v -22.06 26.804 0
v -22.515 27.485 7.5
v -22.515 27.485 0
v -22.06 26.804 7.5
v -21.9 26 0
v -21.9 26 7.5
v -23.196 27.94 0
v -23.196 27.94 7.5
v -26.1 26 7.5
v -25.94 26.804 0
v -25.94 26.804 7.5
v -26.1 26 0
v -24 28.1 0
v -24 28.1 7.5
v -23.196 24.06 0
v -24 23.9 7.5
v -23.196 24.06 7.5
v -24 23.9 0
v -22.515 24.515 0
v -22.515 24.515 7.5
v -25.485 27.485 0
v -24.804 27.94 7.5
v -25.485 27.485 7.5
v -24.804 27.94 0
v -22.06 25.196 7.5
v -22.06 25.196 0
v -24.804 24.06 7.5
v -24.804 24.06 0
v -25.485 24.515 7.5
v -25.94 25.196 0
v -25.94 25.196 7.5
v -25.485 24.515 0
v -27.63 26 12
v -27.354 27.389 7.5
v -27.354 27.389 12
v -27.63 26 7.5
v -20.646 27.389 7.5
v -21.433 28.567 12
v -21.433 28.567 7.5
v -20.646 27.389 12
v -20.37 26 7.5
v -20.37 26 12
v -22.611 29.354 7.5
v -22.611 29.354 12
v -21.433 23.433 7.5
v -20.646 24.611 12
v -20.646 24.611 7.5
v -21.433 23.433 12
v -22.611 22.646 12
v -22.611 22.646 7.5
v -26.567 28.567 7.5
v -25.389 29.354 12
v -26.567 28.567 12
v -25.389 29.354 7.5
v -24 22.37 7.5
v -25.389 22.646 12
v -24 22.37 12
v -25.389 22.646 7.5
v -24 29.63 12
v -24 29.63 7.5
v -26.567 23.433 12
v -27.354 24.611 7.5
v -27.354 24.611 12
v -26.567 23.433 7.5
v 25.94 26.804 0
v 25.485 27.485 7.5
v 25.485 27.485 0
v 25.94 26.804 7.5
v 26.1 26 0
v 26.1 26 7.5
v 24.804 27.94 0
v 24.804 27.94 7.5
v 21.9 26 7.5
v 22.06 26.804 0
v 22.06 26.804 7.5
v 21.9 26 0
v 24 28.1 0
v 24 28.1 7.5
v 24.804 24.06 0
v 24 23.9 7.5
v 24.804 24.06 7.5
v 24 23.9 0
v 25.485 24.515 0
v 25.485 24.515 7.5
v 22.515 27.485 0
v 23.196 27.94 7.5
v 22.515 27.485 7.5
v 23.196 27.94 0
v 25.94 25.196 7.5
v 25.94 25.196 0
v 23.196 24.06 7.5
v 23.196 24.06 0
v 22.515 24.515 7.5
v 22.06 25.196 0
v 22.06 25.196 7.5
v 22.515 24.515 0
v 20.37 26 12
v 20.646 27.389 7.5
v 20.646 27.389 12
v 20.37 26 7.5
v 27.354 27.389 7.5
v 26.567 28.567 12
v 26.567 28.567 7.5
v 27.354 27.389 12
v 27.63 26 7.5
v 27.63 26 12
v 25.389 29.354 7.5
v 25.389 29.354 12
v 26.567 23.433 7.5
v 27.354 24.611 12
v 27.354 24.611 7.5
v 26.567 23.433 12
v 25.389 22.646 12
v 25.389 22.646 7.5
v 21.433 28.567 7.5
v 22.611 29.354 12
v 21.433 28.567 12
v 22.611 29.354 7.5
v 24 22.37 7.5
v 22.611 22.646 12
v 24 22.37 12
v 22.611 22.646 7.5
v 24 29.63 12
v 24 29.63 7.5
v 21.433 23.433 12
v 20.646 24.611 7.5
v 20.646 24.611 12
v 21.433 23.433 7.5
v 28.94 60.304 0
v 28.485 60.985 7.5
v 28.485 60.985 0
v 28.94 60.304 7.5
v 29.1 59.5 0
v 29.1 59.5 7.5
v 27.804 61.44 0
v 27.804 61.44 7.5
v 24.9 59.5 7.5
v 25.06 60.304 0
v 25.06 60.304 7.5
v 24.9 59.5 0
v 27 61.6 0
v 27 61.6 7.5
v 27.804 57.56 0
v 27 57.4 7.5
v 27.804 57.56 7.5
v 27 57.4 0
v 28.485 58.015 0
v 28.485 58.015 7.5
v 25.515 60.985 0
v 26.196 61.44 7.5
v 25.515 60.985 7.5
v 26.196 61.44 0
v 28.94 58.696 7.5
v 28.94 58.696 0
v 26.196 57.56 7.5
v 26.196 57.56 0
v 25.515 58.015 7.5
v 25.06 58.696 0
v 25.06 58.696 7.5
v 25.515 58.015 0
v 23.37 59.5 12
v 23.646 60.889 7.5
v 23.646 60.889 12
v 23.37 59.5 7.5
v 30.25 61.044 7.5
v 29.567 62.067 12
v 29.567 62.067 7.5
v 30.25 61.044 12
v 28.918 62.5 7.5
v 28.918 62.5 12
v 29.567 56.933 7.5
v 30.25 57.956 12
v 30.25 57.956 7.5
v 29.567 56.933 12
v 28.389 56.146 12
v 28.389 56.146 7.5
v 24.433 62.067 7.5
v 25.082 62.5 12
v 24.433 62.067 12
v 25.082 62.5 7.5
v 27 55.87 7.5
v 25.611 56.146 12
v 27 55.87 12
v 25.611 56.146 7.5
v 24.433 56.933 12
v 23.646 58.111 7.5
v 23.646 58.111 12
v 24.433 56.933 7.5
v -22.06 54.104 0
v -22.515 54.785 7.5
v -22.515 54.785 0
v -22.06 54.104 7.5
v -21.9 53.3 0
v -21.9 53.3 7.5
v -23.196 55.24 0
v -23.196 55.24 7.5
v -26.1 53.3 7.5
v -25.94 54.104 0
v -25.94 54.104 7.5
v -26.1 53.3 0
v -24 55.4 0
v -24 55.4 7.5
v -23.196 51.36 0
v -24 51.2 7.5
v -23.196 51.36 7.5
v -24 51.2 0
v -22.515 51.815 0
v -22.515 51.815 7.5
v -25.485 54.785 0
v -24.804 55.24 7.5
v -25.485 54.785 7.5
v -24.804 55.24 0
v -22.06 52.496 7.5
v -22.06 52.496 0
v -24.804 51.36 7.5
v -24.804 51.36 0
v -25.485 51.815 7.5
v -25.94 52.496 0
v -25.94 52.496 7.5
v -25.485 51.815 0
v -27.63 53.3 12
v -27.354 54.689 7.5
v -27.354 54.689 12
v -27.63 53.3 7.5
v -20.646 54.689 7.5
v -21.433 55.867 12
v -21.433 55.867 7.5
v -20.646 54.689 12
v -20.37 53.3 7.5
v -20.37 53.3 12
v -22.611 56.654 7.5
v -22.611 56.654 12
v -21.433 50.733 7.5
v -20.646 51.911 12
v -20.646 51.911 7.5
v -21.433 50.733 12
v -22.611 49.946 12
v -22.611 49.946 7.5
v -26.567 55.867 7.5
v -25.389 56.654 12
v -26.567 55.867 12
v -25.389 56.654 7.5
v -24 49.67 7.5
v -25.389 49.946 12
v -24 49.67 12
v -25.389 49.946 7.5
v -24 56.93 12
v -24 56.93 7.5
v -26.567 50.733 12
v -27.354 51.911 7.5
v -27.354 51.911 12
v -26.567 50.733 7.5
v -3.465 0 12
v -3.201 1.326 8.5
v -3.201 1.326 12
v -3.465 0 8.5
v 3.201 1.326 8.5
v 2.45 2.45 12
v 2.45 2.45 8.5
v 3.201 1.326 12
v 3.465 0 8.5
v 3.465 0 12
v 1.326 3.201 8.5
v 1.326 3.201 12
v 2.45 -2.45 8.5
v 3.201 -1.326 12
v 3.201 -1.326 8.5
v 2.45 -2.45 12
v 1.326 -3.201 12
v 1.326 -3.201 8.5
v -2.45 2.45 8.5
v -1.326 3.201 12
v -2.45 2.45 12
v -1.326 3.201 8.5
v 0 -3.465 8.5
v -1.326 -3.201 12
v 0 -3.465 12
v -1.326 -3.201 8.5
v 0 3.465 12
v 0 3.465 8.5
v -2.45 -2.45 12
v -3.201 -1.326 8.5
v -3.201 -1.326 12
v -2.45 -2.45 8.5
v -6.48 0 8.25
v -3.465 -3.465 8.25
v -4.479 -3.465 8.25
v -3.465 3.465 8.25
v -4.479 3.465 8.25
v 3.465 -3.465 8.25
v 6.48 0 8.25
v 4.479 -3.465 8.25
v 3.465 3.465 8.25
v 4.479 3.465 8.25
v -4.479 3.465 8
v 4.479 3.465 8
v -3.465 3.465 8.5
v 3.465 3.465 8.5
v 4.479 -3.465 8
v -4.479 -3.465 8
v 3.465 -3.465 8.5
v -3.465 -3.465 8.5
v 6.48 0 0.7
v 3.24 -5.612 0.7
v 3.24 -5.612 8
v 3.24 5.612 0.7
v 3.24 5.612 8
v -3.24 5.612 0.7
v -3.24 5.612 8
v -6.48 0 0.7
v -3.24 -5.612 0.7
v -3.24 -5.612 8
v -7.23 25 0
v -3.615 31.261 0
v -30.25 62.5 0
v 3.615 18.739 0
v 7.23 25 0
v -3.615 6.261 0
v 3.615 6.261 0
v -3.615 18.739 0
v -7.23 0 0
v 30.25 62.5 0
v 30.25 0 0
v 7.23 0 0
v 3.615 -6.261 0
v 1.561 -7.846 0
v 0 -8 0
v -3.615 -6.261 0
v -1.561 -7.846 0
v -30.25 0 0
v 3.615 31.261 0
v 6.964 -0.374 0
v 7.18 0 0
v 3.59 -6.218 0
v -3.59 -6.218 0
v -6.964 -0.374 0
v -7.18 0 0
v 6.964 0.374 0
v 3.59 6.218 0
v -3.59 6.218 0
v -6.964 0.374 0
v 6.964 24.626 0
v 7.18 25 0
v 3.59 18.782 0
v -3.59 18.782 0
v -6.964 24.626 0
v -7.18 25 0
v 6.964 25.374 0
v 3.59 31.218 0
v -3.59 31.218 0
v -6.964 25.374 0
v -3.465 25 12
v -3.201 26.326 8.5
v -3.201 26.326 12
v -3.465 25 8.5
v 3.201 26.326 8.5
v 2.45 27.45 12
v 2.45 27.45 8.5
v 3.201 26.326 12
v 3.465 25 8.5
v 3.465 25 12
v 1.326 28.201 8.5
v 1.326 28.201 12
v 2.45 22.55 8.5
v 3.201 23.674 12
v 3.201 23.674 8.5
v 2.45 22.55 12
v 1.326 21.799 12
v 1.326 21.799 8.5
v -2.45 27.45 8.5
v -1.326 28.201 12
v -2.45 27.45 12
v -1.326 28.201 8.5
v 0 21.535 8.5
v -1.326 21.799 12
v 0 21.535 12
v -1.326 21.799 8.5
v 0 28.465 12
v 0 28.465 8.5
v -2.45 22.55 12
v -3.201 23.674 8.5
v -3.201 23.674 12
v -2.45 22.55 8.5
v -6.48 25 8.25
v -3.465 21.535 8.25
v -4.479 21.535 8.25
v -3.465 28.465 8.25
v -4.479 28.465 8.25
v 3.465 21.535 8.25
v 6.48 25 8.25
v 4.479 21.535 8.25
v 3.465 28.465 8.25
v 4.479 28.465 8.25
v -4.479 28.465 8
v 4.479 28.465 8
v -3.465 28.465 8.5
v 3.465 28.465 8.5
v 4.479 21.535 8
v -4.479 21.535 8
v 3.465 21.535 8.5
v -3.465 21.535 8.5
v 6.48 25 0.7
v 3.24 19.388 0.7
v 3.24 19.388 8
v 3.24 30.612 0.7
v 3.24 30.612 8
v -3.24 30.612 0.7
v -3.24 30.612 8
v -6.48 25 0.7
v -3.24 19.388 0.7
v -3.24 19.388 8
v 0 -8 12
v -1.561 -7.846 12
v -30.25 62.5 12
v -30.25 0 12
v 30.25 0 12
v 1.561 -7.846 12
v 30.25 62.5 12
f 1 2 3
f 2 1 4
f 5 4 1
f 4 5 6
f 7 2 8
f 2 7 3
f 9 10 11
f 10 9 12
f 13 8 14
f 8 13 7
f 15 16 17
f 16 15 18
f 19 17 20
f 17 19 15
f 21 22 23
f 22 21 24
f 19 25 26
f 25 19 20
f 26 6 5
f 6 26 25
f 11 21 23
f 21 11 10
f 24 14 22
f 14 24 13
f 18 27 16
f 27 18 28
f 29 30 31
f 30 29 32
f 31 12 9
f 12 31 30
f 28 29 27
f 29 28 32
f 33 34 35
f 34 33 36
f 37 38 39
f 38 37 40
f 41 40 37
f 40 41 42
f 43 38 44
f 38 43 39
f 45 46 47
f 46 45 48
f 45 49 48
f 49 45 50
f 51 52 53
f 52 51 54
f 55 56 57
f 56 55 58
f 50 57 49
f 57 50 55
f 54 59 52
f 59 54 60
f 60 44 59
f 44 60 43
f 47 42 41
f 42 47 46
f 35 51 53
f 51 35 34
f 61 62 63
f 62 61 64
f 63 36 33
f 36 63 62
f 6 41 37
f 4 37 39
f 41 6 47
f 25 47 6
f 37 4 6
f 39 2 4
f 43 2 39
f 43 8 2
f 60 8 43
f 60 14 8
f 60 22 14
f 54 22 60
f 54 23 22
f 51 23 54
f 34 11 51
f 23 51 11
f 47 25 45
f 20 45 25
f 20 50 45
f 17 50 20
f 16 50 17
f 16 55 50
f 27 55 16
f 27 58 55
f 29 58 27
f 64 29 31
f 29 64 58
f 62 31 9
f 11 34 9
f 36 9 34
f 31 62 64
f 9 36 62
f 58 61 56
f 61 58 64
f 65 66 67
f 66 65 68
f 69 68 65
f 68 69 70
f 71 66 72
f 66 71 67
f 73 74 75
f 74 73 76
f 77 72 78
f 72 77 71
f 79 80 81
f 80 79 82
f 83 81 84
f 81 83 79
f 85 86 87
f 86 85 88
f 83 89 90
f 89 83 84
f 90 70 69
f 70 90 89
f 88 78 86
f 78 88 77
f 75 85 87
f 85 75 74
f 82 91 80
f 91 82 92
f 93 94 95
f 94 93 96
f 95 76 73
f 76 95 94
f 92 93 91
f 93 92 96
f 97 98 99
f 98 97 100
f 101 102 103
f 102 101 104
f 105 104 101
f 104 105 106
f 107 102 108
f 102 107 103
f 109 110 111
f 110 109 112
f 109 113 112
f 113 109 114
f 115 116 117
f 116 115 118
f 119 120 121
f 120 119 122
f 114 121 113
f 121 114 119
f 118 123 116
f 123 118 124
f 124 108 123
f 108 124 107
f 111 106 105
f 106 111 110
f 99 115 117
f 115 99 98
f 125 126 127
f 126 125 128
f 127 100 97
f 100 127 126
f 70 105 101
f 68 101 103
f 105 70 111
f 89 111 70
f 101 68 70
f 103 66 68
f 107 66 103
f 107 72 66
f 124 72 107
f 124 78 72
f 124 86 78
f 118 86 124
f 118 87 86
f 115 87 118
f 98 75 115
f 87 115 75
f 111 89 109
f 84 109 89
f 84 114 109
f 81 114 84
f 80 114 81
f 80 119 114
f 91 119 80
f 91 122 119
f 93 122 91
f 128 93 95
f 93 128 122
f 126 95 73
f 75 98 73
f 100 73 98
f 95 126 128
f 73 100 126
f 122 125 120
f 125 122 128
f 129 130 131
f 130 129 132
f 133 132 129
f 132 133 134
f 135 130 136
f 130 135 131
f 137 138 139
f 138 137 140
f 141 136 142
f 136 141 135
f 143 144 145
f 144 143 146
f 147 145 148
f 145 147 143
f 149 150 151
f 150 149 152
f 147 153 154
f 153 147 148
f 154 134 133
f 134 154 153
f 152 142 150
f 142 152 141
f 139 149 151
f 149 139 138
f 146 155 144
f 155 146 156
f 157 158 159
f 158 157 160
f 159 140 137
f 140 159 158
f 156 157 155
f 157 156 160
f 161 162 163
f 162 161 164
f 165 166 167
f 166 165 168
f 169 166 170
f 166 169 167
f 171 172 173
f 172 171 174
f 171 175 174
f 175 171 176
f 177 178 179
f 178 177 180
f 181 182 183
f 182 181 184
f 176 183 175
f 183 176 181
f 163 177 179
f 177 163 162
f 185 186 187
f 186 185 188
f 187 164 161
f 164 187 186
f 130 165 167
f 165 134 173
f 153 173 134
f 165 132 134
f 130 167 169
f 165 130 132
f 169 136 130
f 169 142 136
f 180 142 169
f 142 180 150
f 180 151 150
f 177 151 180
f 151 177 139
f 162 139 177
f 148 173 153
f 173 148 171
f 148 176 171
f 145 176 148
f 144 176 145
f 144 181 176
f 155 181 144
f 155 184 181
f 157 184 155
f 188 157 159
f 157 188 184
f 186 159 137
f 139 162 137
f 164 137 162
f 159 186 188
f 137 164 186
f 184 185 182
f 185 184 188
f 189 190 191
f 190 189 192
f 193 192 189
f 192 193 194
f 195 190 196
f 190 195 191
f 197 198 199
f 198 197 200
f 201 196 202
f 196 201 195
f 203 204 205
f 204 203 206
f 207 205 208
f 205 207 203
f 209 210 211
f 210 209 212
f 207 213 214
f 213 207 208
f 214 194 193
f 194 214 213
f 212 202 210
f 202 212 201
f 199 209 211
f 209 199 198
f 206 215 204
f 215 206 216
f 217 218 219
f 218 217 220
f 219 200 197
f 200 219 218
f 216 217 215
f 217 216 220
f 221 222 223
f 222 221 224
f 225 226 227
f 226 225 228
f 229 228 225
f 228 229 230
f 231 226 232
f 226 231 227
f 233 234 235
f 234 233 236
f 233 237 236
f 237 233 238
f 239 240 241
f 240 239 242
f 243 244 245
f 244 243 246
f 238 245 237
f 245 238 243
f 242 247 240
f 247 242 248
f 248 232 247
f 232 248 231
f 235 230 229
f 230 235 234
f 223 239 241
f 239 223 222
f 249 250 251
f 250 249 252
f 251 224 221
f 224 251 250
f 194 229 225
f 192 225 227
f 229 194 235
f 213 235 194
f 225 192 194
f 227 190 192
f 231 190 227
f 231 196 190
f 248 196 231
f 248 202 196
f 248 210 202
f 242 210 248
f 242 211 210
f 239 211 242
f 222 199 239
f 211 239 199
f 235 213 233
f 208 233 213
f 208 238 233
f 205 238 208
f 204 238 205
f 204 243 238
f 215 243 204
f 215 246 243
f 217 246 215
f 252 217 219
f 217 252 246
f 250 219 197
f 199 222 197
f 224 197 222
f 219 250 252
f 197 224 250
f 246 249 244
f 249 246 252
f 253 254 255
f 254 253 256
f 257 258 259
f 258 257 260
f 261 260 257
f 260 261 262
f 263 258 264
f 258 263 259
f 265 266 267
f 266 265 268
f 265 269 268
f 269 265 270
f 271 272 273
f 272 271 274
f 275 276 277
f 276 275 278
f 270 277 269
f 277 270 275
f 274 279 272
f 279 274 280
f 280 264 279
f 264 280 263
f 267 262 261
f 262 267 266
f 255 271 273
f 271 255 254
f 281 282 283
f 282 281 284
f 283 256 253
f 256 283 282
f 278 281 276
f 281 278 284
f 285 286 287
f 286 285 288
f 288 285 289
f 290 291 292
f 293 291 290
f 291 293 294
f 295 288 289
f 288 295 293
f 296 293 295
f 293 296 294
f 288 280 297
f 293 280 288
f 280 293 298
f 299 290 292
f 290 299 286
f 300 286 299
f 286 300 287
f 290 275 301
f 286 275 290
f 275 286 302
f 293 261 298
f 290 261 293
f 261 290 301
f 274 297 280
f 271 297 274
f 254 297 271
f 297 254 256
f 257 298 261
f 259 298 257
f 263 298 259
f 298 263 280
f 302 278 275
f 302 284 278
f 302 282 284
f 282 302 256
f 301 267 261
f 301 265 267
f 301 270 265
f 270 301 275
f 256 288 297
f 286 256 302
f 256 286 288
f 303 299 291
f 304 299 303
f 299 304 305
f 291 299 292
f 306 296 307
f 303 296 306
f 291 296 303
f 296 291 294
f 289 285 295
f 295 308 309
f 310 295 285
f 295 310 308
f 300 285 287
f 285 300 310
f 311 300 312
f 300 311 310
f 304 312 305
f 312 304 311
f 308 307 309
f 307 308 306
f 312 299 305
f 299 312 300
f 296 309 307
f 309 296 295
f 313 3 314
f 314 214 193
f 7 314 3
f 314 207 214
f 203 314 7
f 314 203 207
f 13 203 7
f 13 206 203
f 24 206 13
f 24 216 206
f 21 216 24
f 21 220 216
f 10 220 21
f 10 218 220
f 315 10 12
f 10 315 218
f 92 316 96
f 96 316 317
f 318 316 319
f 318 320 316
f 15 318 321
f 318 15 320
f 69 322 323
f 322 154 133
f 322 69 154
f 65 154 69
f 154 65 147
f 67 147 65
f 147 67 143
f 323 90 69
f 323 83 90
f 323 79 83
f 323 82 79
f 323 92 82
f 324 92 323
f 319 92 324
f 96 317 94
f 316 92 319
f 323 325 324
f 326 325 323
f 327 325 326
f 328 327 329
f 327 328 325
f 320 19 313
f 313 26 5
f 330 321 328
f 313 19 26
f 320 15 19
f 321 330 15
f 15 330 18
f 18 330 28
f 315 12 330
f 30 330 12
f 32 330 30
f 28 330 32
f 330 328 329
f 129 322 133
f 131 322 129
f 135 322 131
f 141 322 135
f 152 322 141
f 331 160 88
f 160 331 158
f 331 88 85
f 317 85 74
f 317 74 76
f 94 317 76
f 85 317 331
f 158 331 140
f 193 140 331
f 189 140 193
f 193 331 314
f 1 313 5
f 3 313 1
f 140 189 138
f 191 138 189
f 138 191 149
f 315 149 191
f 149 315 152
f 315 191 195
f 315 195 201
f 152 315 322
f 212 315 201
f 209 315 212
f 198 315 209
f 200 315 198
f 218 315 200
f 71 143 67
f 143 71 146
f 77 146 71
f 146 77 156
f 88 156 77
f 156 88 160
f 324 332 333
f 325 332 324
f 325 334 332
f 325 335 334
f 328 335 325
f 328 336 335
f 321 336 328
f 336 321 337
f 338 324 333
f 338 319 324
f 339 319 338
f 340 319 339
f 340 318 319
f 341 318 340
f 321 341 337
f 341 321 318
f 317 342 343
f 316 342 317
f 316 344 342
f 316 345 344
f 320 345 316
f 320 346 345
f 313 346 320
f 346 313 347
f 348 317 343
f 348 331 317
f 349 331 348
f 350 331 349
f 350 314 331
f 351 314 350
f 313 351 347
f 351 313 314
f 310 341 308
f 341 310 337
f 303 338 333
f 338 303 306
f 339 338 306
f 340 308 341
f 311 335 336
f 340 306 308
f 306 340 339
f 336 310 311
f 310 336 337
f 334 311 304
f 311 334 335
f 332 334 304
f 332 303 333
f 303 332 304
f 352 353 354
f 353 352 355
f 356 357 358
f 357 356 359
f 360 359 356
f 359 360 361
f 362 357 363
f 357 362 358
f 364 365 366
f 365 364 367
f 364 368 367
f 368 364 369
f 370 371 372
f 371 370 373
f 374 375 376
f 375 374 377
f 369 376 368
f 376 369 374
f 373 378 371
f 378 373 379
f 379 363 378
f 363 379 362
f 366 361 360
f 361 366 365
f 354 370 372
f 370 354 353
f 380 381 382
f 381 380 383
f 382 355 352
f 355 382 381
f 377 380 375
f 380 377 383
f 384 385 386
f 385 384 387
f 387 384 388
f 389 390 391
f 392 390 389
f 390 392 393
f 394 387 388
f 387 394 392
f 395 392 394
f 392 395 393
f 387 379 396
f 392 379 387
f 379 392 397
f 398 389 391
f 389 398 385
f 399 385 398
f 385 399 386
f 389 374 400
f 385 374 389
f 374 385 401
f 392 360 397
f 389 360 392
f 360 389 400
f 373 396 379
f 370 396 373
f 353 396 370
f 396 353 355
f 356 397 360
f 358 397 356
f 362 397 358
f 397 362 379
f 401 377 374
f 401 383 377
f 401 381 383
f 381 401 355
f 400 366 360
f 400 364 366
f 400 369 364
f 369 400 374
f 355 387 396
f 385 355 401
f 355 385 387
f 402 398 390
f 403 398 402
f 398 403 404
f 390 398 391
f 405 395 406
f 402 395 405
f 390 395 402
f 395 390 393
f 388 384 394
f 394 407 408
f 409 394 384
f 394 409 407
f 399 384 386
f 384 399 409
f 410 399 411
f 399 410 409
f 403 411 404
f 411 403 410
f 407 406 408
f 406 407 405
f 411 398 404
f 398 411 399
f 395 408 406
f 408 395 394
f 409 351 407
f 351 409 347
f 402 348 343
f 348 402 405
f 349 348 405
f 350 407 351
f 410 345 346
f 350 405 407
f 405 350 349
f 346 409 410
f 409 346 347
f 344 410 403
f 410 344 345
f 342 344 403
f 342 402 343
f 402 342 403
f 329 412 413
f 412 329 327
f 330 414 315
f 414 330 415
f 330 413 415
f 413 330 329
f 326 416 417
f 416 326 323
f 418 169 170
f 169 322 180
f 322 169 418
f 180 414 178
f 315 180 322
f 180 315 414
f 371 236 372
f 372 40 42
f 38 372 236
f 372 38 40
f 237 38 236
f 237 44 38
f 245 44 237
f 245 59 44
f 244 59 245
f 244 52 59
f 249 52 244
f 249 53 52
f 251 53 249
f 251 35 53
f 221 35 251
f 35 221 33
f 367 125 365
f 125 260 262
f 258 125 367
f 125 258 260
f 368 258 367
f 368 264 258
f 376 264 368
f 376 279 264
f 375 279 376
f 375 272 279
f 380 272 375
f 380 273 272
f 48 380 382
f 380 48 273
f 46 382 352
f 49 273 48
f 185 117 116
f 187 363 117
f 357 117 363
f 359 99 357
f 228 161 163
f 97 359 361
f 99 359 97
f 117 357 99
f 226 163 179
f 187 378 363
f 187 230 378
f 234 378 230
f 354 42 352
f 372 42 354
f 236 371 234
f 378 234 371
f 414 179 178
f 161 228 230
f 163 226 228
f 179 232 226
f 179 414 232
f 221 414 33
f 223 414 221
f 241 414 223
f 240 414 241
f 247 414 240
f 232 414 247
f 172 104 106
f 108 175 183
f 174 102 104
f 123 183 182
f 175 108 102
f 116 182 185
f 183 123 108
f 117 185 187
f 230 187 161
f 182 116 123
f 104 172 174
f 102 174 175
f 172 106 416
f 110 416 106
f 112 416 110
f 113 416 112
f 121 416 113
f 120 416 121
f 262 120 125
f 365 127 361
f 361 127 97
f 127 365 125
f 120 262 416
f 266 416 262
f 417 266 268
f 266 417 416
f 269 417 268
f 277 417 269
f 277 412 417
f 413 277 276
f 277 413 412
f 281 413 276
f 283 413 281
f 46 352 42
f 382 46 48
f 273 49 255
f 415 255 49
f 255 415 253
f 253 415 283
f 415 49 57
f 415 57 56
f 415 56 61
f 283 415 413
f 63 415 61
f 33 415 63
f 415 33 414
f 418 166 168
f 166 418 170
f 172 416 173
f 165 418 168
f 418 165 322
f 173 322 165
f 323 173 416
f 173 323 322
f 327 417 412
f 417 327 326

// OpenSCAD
/*

Adapter plate to mount a translation stage on the side of a fibre-alignment flexure stage.

(c) Richard Bowman 2016, released under CERN open hardware license

*/

use <utilities.scad>;

//origin is at the top of the mount, in the centre.  Y points downwards.
M3_holes = [[-24,26,0],[24,26,0],[27,59.5,0],[-24,53.3,0]];
base = [60.5,62.5,12];

difference(){
    hull(){
        translate([-base[0]/2,0,0]) cube(base);
        translate([0,0,0]) cylinder(r=8,h=base[2],$fn=32);
    }
    
    //holes to mount to the fibre stage
    for(pos = M3_holes) translate(pos){
        cylinder(d=3.5*1.2, h=999,center=true, $fn=16);
        translate([0,0,base[2]-4.5]) cylinder(d=6.6*1.1,h=999,$fn=16);
    }
    
    //holes to mount to the coarse stage
    repeat([0,25,0], 2){
        translate([0,0,0]) nut_from_bottom(6,h=8);
    }
}
